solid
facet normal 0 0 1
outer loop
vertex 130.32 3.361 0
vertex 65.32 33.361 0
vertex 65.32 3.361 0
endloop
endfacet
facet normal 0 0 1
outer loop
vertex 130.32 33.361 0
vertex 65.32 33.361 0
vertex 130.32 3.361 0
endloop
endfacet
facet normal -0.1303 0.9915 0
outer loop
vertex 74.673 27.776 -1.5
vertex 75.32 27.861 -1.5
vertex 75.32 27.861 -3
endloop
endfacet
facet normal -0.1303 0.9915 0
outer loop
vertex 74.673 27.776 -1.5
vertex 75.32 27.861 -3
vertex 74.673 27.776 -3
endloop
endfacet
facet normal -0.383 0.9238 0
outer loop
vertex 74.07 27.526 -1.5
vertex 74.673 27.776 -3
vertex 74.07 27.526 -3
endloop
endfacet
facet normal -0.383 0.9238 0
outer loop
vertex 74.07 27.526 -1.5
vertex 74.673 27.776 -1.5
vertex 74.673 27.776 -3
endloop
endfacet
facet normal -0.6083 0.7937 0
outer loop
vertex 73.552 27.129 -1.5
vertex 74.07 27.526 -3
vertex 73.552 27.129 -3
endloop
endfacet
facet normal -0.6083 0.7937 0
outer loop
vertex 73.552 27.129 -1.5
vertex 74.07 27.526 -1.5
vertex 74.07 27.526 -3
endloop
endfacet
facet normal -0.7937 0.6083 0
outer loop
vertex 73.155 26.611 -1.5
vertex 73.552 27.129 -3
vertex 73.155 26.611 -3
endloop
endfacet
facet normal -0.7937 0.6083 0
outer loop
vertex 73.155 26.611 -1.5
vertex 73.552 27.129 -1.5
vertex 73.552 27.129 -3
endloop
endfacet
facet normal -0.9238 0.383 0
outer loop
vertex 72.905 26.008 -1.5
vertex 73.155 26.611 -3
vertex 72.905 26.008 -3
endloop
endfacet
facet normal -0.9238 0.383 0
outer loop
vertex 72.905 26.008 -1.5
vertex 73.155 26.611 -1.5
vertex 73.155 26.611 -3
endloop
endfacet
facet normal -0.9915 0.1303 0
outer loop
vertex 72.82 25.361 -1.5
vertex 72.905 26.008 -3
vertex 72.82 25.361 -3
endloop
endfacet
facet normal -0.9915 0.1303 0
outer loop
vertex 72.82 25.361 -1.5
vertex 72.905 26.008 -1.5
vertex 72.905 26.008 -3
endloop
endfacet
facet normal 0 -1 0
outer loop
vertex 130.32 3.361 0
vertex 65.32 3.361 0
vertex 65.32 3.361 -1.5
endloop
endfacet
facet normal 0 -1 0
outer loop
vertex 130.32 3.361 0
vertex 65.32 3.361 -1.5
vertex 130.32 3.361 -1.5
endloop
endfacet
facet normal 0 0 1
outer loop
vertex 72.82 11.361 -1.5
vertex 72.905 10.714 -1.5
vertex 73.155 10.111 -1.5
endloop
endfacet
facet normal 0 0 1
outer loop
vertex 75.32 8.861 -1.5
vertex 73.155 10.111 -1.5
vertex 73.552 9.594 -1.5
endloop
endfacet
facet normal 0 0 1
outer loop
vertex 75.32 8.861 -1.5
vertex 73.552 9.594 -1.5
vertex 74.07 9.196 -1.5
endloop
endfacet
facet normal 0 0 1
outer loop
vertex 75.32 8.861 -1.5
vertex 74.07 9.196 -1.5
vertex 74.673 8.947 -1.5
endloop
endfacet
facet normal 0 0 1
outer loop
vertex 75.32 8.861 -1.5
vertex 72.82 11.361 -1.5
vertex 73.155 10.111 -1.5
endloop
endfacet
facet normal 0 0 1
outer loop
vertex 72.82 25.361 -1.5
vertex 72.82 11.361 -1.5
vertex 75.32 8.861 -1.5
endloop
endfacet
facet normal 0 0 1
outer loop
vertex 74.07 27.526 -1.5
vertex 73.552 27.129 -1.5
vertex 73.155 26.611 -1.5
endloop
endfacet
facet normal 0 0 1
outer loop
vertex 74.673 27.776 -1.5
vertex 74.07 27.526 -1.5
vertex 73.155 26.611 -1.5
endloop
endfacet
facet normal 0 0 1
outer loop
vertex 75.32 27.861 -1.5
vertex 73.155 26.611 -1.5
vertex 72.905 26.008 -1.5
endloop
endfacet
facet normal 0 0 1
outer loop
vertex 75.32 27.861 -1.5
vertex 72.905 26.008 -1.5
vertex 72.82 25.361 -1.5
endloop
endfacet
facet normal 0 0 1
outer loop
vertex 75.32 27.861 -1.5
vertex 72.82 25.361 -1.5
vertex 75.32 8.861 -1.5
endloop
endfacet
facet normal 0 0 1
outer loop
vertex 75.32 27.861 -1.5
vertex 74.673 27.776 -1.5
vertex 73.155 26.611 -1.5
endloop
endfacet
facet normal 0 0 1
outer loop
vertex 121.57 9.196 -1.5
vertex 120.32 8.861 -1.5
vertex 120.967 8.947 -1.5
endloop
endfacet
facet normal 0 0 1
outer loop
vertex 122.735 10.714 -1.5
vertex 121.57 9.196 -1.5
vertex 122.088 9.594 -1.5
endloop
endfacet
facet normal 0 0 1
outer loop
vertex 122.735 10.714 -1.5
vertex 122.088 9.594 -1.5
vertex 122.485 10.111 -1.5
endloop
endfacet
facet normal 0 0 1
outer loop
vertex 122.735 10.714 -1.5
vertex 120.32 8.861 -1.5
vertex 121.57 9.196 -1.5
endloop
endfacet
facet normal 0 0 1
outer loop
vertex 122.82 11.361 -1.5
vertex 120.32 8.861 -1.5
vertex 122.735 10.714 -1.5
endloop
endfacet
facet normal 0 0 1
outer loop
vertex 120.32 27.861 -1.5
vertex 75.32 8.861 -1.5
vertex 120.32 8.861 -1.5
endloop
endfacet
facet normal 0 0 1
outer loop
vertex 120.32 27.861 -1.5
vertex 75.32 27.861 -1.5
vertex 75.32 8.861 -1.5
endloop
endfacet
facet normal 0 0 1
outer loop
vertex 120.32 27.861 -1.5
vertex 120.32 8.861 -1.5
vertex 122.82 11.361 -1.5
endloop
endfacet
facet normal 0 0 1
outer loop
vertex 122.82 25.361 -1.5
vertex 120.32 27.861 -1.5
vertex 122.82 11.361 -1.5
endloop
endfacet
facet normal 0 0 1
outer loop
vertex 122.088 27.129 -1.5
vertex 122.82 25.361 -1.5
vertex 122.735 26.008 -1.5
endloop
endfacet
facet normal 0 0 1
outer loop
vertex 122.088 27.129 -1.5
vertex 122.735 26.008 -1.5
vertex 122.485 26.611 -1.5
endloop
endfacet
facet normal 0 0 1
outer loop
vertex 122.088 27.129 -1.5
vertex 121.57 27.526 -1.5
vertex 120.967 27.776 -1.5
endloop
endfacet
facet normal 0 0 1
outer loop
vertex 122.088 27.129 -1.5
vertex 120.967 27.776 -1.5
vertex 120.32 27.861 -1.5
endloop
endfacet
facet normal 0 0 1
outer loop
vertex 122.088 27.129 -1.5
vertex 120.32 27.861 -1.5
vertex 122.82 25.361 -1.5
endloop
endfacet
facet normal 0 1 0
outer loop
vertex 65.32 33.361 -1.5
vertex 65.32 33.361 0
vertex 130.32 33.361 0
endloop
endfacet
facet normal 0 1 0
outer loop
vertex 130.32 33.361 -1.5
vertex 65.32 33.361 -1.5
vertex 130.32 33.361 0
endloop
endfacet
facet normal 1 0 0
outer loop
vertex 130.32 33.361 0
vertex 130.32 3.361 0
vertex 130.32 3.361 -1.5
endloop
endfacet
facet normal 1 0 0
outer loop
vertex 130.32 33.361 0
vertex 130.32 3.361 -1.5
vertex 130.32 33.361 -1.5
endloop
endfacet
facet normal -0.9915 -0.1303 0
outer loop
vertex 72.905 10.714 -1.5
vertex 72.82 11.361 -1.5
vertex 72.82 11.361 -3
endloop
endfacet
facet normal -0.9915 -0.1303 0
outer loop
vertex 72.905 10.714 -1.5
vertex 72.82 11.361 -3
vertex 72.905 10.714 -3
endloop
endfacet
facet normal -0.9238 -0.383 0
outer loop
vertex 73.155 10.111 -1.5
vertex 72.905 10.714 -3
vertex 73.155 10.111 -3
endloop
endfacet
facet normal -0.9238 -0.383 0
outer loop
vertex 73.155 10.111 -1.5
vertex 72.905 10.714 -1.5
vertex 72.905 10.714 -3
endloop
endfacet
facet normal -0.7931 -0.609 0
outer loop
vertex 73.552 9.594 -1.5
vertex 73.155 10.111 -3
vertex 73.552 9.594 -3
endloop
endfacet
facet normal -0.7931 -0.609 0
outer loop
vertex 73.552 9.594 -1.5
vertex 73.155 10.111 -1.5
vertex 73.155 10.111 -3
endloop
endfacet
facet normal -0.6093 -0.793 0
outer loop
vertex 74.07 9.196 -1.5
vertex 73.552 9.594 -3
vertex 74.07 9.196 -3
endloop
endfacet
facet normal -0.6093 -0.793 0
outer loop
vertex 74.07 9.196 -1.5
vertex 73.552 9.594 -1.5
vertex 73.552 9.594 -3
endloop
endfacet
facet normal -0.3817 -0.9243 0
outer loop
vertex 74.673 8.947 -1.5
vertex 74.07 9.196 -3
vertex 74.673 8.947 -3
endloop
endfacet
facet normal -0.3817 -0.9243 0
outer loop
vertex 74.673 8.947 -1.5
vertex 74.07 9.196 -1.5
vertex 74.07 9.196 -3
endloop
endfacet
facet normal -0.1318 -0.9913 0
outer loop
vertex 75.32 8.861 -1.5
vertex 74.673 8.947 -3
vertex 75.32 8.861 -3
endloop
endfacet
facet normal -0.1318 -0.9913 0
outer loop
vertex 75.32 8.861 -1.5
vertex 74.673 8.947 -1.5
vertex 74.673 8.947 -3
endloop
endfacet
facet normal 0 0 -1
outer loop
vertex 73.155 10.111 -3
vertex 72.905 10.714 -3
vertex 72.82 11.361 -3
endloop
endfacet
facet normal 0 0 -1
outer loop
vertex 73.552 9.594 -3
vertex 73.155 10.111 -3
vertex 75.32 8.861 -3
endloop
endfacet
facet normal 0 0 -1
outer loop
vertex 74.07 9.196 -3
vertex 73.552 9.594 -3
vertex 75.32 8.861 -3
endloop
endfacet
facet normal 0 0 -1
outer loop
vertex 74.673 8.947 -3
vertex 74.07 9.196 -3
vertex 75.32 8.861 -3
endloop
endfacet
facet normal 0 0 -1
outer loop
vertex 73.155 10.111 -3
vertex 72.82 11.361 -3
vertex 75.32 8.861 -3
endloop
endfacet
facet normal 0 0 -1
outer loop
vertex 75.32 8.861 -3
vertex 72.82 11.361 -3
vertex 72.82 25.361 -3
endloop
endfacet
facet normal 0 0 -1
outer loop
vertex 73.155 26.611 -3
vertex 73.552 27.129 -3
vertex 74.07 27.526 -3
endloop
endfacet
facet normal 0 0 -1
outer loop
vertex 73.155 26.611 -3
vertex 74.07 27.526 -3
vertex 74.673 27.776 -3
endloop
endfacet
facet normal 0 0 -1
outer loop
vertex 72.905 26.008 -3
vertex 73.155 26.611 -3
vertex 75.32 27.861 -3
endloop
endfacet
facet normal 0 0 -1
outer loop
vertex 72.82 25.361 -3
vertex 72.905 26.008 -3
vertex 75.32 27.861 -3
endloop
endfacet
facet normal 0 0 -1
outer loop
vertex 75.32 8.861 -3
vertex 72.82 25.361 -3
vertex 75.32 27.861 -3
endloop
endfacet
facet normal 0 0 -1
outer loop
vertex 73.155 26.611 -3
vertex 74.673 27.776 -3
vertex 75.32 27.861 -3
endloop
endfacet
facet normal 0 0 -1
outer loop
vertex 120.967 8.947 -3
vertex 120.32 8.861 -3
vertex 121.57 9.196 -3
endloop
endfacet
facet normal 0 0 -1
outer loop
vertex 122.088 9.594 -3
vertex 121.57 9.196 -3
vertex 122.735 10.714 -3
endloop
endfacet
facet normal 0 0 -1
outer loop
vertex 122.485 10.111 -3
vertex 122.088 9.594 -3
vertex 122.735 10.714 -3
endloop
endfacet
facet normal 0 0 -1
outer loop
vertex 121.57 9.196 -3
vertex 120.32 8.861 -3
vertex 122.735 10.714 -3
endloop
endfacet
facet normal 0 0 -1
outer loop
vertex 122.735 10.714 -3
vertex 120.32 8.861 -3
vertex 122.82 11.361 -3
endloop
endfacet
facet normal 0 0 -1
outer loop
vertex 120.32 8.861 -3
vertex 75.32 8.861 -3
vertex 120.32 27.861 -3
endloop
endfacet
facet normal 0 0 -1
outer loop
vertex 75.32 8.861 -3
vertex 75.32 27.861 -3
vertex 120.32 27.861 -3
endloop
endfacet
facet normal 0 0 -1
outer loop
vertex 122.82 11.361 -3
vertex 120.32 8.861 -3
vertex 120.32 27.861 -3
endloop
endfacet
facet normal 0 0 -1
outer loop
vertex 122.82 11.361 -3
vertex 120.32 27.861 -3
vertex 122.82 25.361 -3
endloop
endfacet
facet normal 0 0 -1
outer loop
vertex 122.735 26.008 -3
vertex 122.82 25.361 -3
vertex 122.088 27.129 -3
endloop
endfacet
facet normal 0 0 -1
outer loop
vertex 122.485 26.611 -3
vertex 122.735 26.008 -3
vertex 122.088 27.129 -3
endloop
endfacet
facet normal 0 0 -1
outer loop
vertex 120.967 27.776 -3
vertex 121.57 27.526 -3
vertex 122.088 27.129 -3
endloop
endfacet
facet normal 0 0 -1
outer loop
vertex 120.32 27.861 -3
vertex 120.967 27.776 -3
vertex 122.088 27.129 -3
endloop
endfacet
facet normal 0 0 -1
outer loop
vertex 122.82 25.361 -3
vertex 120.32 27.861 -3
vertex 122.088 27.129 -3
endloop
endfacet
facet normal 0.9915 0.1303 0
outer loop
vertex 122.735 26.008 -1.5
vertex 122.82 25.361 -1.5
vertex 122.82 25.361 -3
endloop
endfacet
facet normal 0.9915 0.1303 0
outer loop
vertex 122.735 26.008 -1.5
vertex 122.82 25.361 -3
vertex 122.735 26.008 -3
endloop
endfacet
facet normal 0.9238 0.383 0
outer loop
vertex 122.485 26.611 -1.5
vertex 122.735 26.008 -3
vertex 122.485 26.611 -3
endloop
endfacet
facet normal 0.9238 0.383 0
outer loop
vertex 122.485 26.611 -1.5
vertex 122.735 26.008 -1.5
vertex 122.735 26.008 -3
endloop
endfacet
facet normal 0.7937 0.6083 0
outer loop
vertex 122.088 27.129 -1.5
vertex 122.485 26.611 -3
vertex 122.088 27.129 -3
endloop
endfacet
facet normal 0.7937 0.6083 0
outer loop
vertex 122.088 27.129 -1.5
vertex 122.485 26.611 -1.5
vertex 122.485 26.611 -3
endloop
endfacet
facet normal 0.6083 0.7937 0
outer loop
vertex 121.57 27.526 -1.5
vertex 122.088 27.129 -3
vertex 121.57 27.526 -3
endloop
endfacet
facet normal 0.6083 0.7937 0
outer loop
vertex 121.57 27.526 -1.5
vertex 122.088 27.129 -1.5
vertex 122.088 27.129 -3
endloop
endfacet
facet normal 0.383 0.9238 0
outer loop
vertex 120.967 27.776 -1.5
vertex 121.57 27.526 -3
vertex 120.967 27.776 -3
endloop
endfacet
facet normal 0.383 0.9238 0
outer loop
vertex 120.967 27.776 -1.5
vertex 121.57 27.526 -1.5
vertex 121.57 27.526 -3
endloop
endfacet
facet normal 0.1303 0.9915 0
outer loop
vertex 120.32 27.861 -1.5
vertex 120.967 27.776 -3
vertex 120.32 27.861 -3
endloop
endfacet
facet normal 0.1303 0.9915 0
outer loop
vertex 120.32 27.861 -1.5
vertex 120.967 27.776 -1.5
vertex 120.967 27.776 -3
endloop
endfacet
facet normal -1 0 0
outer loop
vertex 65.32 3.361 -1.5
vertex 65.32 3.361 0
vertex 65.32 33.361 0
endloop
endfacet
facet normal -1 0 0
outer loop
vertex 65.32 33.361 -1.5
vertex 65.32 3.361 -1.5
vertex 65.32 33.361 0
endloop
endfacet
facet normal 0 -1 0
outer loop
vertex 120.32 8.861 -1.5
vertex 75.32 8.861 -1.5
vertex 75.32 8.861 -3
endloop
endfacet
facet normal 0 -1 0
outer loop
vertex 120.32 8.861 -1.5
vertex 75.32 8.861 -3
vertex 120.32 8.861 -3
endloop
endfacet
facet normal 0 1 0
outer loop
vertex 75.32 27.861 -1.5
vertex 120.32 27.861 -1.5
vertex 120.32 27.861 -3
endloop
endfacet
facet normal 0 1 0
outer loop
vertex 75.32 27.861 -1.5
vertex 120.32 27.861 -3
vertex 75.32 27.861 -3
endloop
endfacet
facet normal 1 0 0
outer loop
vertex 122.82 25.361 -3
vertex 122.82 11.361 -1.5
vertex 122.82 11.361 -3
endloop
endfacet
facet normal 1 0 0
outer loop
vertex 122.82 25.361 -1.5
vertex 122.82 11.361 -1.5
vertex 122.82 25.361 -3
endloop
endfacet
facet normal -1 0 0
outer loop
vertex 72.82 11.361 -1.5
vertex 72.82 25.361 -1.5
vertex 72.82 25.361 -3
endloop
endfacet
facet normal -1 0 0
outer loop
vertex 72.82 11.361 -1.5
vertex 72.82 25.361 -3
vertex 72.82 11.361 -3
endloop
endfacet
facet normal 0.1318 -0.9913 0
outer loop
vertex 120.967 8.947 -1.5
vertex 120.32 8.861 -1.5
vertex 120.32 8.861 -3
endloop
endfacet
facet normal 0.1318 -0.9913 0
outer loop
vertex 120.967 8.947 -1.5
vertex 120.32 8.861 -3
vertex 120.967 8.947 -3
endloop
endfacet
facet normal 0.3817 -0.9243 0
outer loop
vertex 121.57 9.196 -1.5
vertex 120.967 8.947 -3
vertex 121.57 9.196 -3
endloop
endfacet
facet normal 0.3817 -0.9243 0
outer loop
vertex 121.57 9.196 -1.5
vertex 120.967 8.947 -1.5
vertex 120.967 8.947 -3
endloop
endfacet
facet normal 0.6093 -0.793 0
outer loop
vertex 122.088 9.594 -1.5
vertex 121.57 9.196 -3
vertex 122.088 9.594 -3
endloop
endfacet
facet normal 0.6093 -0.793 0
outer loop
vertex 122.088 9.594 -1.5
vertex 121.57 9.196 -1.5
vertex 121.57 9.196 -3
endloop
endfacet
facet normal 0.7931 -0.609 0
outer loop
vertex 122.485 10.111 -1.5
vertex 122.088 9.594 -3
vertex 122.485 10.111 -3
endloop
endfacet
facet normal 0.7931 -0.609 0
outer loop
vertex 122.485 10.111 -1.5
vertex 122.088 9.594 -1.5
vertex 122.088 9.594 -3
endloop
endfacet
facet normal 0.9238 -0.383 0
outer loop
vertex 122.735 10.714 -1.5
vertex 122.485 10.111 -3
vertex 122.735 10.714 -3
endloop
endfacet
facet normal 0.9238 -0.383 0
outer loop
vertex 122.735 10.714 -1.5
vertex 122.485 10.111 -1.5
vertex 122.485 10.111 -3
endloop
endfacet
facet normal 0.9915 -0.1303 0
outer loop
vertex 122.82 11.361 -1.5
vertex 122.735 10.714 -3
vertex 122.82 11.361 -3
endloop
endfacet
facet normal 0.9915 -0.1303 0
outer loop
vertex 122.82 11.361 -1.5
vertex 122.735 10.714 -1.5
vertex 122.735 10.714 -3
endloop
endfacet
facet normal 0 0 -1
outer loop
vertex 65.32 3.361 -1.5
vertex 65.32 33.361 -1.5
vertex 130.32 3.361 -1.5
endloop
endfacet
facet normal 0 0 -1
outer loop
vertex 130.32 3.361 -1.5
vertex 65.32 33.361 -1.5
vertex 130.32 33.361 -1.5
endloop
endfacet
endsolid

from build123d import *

# Parameters (mm, degrees)
SKETCH1_W           = 65
SKETCH1_H           = 30
BOSS_EXTRUDE1_DEPTH = 1.5
BOSS_EXTRUDE2_DEPTH = 1.5


with BuildPart() as part:
    # Sketch1 → Boss-Extrude1 (new body)
    with BuildSketch(Plane.XY):
        with Locations((97.82, 18.3614)):
            Rectangle(SKETCH1_W, SKETCH1_H)
    extrude(amount=-BOSS_EXTRUDE1_DEPTH)


with BuildPart() as body_2:
    # Sketch2 → Boss-Extrude2 (new body)
    with BuildSketch(Plane(origin=(0, 0, -1.5), x_dir=(-1, 0, 0), z_dir=(0, 0, -1))):
        with BuildLine():
            Line((-120.32, 27.8614), (-75.32, 27.8614))
            ThreePointArc((-75.32, 27.8614), (-73.552233047, 27.129166953), (-72.82, 25.3614))
            Line((-72.82, 25.3614), (-72.82, 11.3614))
            ThreePointArc((-72.82, 11.3614), (-73.552233047, 9.593633047), (-75.32, 8.8614))
            Line((-75.32, 8.8614), (-120.32, 8.8614))
            ThreePointArc((-120.32, 8.8614), (-122.087766953, 9.593633047), (-122.82, 11.3614))
            Line((-122.82, 11.3614), (-122.82, 25.3614))
            ThreePointArc((-122.82, 25.3614), (-122.087766953, 27.129166953), (-120.32, 27.8614))
        make_face()
    extrude(amount=BOSS_EXTRUDE2_DEPTH)


solid = Compound([part.part, body_2.part])
